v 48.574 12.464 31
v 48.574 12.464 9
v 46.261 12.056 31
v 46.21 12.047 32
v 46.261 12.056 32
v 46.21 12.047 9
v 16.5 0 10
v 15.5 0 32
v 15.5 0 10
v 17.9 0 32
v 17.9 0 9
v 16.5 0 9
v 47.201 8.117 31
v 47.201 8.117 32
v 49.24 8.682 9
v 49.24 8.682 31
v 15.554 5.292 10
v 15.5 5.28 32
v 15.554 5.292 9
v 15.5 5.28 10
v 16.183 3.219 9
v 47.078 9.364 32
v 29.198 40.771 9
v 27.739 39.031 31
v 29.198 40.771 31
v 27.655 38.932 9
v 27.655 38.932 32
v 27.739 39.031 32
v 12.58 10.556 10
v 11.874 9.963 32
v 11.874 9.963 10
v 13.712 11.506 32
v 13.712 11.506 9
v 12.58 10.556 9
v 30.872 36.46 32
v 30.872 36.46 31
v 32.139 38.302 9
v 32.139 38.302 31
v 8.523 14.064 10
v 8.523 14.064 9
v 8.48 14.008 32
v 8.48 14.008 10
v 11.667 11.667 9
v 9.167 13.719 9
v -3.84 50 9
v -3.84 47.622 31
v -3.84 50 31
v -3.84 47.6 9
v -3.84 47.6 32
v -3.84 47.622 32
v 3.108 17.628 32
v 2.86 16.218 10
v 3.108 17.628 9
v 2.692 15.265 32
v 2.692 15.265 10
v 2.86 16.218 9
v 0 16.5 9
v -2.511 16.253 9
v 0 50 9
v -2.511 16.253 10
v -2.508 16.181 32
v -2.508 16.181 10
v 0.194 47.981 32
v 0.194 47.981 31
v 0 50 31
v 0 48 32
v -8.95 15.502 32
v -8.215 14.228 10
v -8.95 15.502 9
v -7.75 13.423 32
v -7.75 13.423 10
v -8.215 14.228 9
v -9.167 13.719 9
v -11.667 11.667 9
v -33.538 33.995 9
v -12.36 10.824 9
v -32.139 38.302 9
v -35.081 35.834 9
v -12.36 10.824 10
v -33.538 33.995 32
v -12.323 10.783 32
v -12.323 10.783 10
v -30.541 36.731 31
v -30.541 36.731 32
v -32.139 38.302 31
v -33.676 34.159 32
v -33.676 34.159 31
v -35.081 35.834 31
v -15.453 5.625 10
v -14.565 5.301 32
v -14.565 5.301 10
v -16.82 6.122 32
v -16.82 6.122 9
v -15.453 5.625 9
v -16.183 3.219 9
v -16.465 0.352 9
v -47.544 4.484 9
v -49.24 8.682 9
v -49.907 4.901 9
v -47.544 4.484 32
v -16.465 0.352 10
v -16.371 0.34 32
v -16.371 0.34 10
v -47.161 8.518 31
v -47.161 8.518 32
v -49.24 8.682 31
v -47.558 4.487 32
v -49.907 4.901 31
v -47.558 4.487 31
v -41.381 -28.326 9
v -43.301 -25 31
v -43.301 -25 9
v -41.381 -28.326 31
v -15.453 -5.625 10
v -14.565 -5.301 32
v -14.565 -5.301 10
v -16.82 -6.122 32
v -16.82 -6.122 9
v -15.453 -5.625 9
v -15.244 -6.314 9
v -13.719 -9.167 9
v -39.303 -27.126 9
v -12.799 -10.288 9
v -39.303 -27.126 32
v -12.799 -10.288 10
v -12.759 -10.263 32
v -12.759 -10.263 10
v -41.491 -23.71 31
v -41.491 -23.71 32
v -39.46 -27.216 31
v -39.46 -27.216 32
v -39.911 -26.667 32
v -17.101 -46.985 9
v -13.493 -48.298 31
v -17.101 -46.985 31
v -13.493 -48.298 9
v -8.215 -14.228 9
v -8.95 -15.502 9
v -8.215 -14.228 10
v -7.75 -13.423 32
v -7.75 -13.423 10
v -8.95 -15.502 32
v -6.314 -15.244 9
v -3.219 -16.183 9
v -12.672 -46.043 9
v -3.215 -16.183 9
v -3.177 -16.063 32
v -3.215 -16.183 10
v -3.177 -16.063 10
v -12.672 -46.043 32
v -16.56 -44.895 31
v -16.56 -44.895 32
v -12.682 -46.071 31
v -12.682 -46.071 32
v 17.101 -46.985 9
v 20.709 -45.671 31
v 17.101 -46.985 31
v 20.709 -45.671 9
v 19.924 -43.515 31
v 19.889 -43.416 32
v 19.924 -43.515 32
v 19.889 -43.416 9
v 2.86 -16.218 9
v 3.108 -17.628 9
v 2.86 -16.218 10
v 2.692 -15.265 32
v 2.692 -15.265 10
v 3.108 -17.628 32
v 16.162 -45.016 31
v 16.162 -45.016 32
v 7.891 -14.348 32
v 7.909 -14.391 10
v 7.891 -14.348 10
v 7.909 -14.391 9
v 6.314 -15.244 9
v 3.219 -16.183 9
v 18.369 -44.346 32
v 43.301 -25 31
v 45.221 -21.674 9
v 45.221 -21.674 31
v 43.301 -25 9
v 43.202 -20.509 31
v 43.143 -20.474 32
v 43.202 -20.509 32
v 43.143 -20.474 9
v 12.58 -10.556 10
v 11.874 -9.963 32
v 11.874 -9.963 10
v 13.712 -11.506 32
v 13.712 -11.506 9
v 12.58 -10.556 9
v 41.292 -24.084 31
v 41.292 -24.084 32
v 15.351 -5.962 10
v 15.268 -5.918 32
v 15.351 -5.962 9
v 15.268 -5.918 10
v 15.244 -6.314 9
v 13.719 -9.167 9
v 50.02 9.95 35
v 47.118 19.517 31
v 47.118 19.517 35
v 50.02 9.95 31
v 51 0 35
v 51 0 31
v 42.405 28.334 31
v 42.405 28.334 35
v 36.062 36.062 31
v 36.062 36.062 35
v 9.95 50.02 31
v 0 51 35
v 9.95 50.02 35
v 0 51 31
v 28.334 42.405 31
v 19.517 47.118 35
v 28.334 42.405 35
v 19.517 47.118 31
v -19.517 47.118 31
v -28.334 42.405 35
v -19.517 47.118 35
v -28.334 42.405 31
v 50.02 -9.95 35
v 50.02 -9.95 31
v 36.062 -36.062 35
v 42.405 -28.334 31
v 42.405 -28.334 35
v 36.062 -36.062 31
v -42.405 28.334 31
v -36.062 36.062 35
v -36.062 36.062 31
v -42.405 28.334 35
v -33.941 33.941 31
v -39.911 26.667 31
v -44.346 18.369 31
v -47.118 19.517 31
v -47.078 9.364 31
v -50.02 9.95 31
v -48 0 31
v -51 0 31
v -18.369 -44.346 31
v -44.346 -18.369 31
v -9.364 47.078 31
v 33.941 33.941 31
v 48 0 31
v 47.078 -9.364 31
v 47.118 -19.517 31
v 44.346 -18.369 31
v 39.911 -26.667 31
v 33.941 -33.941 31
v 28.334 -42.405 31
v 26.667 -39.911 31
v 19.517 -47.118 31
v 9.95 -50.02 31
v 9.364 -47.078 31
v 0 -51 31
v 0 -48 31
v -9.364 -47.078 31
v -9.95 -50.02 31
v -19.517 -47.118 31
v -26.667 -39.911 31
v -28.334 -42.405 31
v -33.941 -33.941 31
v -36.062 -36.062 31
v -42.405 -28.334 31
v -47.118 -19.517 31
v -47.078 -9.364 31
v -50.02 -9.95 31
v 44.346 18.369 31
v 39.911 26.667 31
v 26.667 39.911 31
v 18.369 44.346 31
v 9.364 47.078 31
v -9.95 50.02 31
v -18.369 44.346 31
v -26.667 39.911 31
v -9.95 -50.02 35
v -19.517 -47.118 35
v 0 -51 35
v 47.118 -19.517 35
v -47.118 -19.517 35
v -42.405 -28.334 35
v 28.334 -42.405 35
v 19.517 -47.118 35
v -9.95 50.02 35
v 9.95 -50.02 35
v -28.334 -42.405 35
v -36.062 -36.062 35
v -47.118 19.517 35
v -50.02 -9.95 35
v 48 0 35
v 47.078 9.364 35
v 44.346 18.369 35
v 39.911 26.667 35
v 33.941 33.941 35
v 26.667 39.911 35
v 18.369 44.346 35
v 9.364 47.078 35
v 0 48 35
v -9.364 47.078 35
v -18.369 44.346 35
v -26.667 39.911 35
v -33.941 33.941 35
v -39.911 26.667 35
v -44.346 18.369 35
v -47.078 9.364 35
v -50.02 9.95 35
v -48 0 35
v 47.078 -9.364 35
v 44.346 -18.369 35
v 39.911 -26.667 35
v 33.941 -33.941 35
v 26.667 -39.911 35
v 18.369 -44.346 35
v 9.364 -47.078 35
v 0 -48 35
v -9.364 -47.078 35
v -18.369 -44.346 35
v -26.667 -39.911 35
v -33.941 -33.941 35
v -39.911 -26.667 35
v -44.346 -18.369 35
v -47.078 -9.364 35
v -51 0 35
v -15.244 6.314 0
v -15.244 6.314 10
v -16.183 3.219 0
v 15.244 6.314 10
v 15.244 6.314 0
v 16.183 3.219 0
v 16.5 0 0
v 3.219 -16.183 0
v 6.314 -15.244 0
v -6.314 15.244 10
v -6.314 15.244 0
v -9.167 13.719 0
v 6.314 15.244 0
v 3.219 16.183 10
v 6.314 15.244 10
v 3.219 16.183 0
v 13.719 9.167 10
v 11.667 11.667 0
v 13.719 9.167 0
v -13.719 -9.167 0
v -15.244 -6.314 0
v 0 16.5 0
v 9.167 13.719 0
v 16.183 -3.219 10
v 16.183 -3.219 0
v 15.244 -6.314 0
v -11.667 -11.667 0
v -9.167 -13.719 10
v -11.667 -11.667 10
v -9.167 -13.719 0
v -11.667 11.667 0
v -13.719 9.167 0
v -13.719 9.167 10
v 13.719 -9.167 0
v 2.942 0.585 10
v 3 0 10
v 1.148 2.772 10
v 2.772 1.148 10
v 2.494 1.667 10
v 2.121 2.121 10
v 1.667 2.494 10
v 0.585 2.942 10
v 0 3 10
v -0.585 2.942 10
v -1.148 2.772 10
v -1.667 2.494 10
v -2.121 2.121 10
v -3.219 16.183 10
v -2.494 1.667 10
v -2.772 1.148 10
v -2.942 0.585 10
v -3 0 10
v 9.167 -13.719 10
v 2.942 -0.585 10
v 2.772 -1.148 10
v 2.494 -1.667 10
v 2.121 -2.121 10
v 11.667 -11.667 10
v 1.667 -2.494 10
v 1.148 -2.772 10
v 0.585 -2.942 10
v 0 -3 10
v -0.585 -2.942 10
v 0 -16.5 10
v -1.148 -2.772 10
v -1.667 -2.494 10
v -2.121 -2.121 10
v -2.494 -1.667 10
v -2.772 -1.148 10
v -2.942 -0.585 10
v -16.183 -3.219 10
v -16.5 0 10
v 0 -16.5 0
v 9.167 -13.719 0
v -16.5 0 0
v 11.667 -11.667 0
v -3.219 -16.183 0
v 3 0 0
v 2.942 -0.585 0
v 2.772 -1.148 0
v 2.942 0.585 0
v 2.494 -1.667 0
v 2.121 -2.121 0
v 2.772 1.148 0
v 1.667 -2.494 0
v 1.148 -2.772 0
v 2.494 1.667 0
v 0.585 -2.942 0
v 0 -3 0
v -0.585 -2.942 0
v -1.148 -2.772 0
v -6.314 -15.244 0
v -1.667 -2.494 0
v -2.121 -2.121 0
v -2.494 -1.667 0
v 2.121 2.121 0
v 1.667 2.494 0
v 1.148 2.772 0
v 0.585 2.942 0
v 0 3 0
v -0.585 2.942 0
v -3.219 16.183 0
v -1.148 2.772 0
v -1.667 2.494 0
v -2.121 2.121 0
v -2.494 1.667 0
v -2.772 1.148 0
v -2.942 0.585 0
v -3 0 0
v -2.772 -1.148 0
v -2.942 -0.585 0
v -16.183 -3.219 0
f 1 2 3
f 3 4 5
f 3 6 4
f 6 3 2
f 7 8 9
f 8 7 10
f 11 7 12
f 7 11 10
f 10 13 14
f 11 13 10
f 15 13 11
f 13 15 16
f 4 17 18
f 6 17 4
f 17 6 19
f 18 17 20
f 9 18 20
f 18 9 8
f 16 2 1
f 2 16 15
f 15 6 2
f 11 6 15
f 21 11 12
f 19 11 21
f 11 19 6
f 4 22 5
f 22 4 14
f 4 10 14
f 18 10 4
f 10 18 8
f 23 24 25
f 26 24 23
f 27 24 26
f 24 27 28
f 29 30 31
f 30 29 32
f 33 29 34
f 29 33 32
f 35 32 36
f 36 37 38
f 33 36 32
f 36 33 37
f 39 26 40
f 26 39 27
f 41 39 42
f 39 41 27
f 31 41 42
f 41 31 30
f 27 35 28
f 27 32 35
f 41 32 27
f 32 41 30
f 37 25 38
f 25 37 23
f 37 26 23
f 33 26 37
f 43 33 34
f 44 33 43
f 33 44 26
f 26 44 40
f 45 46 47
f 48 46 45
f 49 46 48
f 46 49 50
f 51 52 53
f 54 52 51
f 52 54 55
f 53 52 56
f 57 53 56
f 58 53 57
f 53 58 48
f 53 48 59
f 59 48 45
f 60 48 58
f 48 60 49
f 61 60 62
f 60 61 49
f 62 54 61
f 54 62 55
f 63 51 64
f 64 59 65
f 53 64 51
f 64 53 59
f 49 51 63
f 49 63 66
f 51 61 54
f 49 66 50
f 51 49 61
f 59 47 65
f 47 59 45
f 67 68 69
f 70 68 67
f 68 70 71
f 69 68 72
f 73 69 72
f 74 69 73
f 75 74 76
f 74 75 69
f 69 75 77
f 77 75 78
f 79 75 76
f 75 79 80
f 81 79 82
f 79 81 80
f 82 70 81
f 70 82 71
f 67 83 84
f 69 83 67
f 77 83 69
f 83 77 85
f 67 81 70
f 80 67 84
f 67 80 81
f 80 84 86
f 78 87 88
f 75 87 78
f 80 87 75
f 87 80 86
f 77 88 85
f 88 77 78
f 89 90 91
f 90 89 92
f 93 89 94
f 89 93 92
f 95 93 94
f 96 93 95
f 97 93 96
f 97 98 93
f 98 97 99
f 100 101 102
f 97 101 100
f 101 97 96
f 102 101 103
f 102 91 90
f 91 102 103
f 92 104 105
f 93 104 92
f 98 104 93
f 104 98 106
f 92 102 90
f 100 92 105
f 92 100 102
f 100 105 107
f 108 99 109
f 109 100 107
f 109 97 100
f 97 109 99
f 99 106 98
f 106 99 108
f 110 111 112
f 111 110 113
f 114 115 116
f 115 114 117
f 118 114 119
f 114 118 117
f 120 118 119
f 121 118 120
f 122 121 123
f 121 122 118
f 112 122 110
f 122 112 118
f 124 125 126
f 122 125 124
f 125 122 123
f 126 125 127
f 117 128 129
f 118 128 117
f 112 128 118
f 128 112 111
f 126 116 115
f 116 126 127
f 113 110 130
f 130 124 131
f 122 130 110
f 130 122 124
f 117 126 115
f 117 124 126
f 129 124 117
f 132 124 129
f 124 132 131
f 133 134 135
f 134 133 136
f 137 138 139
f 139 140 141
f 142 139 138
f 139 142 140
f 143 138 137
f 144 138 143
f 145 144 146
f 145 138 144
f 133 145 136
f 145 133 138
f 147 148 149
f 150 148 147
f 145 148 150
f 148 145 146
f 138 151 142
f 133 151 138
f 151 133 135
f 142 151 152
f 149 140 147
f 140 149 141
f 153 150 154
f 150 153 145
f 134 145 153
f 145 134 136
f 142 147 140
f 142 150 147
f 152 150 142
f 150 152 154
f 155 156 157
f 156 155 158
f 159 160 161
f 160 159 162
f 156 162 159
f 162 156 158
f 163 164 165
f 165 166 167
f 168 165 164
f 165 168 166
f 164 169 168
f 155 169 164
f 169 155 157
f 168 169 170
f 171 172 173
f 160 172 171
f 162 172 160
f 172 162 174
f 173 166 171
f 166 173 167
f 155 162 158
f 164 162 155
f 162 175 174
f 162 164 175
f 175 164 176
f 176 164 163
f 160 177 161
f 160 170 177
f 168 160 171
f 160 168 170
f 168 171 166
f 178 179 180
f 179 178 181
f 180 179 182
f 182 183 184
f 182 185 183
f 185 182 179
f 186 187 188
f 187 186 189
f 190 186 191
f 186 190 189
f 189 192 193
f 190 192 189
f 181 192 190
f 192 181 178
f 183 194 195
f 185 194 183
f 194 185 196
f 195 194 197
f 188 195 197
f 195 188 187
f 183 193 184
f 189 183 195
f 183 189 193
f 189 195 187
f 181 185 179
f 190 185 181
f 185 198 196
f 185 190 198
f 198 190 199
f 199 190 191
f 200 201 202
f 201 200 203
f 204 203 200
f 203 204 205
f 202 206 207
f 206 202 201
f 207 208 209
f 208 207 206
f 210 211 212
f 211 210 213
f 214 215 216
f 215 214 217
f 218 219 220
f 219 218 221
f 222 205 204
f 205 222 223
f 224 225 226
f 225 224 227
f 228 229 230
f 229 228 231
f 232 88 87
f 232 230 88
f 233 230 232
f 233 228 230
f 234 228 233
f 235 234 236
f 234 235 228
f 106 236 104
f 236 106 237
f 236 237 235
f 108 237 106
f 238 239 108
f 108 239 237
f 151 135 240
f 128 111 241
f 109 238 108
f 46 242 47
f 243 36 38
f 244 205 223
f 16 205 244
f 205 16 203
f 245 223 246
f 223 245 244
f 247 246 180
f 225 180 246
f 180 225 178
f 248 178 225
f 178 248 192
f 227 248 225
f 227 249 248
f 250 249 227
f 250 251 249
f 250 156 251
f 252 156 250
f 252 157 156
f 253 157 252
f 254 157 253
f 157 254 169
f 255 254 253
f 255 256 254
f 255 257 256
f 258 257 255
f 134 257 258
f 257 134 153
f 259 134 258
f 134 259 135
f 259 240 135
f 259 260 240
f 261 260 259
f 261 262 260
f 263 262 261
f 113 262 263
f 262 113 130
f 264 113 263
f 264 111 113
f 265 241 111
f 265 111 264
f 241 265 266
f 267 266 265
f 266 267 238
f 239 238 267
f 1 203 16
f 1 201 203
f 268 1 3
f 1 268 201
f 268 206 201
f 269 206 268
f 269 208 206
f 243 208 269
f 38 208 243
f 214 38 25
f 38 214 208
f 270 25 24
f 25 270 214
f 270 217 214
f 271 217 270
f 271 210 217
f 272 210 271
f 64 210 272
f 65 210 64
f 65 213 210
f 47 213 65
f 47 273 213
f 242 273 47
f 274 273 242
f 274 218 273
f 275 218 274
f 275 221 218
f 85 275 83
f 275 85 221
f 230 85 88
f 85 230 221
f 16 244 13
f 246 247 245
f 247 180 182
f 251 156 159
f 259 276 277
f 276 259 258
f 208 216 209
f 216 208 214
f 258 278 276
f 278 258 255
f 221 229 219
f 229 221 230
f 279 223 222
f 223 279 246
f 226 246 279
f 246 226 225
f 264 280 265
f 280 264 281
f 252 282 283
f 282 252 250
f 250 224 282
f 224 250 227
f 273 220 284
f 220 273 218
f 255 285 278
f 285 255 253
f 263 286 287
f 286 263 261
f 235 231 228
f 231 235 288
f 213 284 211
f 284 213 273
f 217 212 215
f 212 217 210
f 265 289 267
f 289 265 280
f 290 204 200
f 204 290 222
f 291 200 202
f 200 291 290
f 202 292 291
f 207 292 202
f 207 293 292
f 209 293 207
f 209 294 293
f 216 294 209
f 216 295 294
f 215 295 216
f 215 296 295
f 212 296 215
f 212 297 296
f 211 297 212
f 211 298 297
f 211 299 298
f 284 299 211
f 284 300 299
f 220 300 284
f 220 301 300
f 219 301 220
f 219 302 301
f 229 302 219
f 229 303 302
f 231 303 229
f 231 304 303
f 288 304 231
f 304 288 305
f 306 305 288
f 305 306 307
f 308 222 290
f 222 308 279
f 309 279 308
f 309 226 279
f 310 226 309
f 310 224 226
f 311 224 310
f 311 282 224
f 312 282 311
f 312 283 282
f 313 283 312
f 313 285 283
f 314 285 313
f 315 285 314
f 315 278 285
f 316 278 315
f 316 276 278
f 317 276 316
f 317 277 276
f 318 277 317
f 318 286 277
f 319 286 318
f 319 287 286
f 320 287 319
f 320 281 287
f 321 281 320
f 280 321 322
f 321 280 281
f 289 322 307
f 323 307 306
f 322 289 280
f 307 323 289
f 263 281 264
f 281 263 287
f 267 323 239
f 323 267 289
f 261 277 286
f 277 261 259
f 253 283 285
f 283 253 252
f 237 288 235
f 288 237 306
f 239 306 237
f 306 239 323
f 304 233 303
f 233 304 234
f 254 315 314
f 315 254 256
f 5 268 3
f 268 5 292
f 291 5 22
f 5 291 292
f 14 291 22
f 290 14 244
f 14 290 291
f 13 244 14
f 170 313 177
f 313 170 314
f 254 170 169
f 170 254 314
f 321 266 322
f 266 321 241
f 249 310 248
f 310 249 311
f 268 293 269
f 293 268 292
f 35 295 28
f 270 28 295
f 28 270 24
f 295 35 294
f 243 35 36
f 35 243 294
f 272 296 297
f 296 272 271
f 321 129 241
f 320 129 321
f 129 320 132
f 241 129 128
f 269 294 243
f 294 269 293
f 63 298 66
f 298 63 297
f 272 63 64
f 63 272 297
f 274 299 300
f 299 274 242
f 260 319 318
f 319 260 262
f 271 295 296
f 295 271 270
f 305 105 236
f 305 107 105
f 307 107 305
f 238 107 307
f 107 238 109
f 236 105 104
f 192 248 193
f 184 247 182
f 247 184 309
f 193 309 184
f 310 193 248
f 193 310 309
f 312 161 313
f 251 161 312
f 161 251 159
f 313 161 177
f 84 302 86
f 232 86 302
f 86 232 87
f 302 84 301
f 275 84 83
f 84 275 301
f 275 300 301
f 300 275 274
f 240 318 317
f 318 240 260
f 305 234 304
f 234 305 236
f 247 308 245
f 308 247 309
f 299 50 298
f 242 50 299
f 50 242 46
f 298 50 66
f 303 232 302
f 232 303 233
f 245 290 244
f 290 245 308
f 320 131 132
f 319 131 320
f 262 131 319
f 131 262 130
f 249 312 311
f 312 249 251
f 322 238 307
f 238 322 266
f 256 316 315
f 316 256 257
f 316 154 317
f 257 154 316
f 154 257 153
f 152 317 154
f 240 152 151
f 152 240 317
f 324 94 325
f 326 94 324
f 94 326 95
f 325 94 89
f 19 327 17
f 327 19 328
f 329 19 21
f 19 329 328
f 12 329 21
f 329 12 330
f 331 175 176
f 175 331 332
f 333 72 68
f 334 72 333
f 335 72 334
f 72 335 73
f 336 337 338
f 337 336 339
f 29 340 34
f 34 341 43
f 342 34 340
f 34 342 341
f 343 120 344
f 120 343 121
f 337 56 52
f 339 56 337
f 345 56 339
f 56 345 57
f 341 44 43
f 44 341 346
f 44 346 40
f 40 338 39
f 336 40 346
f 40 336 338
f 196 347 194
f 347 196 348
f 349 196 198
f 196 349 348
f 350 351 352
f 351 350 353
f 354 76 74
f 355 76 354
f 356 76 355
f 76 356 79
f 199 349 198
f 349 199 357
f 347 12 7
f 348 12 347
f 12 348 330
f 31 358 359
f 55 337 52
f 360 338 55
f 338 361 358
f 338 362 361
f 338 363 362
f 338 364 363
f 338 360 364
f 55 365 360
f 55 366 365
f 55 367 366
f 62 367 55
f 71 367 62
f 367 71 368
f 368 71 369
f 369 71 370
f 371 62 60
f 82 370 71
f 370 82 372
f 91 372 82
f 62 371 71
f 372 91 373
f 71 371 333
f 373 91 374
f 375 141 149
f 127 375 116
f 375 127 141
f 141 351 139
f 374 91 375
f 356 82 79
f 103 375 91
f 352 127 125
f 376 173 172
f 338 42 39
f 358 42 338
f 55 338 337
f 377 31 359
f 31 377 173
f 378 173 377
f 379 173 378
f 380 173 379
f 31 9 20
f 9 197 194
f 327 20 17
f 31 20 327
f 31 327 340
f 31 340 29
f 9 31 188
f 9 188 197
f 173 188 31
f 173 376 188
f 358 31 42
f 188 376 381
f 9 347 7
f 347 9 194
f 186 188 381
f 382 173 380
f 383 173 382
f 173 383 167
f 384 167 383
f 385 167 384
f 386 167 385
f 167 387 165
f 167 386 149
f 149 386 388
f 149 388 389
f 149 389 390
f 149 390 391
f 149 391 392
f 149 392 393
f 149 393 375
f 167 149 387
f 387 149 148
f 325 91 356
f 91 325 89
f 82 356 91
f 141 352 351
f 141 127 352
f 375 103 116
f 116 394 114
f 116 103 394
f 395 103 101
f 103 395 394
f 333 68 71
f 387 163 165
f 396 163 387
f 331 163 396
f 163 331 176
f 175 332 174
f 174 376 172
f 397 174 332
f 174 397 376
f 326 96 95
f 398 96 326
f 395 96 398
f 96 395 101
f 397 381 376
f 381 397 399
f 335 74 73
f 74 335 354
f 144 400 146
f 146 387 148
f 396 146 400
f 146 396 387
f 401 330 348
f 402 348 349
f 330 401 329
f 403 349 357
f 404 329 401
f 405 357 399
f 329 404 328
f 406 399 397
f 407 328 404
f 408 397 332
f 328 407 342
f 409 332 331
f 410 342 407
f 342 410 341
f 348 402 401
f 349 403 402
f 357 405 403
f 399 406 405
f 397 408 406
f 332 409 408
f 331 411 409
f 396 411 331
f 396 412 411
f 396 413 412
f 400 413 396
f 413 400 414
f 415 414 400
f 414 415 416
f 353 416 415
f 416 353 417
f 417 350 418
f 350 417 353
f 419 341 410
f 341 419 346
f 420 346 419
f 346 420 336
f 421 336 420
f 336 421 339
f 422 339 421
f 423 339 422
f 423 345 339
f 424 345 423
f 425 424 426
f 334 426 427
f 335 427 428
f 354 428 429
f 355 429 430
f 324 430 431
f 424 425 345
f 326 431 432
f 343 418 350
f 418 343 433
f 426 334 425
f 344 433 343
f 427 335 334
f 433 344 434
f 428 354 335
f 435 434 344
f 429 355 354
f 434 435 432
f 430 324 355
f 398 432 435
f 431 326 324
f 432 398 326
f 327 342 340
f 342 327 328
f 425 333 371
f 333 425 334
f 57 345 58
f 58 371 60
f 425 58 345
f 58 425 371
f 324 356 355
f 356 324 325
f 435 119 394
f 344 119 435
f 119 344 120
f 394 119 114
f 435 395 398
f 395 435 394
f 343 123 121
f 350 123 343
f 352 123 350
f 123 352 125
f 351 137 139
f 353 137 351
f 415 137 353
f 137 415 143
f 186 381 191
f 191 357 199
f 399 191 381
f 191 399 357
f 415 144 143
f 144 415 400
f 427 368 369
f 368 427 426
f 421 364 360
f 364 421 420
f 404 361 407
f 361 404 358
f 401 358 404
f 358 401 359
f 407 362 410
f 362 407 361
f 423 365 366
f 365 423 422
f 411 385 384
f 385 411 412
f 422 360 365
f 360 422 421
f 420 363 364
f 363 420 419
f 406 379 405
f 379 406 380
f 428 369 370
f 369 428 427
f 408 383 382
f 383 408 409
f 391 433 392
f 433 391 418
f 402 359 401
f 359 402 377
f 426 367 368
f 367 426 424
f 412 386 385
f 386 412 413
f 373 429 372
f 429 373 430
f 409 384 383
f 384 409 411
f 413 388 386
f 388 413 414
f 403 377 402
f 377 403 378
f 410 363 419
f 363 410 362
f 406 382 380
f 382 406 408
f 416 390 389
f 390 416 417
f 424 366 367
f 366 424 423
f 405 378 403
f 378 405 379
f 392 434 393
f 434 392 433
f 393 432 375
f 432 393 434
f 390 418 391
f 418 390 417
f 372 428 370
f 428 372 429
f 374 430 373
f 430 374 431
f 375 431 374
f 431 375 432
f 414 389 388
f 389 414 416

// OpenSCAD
$fn = 32;

// ----------------------------------------------------------------------
// Impeller: 100 mm, 9 blades, 35 mm tall
// ----------------------------------------------------------------------

// --- parameters (mm) ---
boss_d = 33;              // hub diameter
boss_h = 10;              // hub height
rotor_d = 100;            // outer diameter over the blades
vane_count = 9;           // number of blades
blade_t = 2.4;            // blade thickness
blade_h = 22;             // blade height
blade_in_r = 15.5;        // blade root radius
blade_out_r = 47.6;       // blade tip radius
sweep = 10;               // blade sweep, degrees
bore_d = 6;               // shaft bore
shroud_h = 3;             // shroud ring thickness
shroud_d = 102;           // shroud outside diameter

module hub() {
  cylinder(h = boss_h, d = boss_d);
}

module blade() {
  /* blade swept between two boxes: hull of the root and the tip section */
  hull() {
    translate([blade_in_r, 0, boss_h - 1])
      cube([blade_t, blade_t * 2.2, blade_h + 1], center = false);
    rotate([0, 0, sweep])
      translate([blade_out_r, 0, boss_h - 1])
        cube([blade_t, blade_t * 1.6, blade_h + 1], center = false);
  }
}

module blades() {
  for (i = [0 : vane_count - 1])
    rotate([0, 0, i * 360 / vane_count]) blade();
}

module shroud() {
  translate([0, 0, boss_h + blade_h - 1])
    difference() {
      cylinder(h = shroud_h + 1, d = shroud_d);
      translate([0, 0, -1]) cylinder(h = shroud_h + 3, d = shroud_d - 2 * 3);
    }
}

difference() {
  union() {
    hub();
    blades();
    shroud();
  }
  translate([0, 0, -1]) cylinder(h = boss_h + blade_h + shroud_h + 3, d = bore_d);
}
